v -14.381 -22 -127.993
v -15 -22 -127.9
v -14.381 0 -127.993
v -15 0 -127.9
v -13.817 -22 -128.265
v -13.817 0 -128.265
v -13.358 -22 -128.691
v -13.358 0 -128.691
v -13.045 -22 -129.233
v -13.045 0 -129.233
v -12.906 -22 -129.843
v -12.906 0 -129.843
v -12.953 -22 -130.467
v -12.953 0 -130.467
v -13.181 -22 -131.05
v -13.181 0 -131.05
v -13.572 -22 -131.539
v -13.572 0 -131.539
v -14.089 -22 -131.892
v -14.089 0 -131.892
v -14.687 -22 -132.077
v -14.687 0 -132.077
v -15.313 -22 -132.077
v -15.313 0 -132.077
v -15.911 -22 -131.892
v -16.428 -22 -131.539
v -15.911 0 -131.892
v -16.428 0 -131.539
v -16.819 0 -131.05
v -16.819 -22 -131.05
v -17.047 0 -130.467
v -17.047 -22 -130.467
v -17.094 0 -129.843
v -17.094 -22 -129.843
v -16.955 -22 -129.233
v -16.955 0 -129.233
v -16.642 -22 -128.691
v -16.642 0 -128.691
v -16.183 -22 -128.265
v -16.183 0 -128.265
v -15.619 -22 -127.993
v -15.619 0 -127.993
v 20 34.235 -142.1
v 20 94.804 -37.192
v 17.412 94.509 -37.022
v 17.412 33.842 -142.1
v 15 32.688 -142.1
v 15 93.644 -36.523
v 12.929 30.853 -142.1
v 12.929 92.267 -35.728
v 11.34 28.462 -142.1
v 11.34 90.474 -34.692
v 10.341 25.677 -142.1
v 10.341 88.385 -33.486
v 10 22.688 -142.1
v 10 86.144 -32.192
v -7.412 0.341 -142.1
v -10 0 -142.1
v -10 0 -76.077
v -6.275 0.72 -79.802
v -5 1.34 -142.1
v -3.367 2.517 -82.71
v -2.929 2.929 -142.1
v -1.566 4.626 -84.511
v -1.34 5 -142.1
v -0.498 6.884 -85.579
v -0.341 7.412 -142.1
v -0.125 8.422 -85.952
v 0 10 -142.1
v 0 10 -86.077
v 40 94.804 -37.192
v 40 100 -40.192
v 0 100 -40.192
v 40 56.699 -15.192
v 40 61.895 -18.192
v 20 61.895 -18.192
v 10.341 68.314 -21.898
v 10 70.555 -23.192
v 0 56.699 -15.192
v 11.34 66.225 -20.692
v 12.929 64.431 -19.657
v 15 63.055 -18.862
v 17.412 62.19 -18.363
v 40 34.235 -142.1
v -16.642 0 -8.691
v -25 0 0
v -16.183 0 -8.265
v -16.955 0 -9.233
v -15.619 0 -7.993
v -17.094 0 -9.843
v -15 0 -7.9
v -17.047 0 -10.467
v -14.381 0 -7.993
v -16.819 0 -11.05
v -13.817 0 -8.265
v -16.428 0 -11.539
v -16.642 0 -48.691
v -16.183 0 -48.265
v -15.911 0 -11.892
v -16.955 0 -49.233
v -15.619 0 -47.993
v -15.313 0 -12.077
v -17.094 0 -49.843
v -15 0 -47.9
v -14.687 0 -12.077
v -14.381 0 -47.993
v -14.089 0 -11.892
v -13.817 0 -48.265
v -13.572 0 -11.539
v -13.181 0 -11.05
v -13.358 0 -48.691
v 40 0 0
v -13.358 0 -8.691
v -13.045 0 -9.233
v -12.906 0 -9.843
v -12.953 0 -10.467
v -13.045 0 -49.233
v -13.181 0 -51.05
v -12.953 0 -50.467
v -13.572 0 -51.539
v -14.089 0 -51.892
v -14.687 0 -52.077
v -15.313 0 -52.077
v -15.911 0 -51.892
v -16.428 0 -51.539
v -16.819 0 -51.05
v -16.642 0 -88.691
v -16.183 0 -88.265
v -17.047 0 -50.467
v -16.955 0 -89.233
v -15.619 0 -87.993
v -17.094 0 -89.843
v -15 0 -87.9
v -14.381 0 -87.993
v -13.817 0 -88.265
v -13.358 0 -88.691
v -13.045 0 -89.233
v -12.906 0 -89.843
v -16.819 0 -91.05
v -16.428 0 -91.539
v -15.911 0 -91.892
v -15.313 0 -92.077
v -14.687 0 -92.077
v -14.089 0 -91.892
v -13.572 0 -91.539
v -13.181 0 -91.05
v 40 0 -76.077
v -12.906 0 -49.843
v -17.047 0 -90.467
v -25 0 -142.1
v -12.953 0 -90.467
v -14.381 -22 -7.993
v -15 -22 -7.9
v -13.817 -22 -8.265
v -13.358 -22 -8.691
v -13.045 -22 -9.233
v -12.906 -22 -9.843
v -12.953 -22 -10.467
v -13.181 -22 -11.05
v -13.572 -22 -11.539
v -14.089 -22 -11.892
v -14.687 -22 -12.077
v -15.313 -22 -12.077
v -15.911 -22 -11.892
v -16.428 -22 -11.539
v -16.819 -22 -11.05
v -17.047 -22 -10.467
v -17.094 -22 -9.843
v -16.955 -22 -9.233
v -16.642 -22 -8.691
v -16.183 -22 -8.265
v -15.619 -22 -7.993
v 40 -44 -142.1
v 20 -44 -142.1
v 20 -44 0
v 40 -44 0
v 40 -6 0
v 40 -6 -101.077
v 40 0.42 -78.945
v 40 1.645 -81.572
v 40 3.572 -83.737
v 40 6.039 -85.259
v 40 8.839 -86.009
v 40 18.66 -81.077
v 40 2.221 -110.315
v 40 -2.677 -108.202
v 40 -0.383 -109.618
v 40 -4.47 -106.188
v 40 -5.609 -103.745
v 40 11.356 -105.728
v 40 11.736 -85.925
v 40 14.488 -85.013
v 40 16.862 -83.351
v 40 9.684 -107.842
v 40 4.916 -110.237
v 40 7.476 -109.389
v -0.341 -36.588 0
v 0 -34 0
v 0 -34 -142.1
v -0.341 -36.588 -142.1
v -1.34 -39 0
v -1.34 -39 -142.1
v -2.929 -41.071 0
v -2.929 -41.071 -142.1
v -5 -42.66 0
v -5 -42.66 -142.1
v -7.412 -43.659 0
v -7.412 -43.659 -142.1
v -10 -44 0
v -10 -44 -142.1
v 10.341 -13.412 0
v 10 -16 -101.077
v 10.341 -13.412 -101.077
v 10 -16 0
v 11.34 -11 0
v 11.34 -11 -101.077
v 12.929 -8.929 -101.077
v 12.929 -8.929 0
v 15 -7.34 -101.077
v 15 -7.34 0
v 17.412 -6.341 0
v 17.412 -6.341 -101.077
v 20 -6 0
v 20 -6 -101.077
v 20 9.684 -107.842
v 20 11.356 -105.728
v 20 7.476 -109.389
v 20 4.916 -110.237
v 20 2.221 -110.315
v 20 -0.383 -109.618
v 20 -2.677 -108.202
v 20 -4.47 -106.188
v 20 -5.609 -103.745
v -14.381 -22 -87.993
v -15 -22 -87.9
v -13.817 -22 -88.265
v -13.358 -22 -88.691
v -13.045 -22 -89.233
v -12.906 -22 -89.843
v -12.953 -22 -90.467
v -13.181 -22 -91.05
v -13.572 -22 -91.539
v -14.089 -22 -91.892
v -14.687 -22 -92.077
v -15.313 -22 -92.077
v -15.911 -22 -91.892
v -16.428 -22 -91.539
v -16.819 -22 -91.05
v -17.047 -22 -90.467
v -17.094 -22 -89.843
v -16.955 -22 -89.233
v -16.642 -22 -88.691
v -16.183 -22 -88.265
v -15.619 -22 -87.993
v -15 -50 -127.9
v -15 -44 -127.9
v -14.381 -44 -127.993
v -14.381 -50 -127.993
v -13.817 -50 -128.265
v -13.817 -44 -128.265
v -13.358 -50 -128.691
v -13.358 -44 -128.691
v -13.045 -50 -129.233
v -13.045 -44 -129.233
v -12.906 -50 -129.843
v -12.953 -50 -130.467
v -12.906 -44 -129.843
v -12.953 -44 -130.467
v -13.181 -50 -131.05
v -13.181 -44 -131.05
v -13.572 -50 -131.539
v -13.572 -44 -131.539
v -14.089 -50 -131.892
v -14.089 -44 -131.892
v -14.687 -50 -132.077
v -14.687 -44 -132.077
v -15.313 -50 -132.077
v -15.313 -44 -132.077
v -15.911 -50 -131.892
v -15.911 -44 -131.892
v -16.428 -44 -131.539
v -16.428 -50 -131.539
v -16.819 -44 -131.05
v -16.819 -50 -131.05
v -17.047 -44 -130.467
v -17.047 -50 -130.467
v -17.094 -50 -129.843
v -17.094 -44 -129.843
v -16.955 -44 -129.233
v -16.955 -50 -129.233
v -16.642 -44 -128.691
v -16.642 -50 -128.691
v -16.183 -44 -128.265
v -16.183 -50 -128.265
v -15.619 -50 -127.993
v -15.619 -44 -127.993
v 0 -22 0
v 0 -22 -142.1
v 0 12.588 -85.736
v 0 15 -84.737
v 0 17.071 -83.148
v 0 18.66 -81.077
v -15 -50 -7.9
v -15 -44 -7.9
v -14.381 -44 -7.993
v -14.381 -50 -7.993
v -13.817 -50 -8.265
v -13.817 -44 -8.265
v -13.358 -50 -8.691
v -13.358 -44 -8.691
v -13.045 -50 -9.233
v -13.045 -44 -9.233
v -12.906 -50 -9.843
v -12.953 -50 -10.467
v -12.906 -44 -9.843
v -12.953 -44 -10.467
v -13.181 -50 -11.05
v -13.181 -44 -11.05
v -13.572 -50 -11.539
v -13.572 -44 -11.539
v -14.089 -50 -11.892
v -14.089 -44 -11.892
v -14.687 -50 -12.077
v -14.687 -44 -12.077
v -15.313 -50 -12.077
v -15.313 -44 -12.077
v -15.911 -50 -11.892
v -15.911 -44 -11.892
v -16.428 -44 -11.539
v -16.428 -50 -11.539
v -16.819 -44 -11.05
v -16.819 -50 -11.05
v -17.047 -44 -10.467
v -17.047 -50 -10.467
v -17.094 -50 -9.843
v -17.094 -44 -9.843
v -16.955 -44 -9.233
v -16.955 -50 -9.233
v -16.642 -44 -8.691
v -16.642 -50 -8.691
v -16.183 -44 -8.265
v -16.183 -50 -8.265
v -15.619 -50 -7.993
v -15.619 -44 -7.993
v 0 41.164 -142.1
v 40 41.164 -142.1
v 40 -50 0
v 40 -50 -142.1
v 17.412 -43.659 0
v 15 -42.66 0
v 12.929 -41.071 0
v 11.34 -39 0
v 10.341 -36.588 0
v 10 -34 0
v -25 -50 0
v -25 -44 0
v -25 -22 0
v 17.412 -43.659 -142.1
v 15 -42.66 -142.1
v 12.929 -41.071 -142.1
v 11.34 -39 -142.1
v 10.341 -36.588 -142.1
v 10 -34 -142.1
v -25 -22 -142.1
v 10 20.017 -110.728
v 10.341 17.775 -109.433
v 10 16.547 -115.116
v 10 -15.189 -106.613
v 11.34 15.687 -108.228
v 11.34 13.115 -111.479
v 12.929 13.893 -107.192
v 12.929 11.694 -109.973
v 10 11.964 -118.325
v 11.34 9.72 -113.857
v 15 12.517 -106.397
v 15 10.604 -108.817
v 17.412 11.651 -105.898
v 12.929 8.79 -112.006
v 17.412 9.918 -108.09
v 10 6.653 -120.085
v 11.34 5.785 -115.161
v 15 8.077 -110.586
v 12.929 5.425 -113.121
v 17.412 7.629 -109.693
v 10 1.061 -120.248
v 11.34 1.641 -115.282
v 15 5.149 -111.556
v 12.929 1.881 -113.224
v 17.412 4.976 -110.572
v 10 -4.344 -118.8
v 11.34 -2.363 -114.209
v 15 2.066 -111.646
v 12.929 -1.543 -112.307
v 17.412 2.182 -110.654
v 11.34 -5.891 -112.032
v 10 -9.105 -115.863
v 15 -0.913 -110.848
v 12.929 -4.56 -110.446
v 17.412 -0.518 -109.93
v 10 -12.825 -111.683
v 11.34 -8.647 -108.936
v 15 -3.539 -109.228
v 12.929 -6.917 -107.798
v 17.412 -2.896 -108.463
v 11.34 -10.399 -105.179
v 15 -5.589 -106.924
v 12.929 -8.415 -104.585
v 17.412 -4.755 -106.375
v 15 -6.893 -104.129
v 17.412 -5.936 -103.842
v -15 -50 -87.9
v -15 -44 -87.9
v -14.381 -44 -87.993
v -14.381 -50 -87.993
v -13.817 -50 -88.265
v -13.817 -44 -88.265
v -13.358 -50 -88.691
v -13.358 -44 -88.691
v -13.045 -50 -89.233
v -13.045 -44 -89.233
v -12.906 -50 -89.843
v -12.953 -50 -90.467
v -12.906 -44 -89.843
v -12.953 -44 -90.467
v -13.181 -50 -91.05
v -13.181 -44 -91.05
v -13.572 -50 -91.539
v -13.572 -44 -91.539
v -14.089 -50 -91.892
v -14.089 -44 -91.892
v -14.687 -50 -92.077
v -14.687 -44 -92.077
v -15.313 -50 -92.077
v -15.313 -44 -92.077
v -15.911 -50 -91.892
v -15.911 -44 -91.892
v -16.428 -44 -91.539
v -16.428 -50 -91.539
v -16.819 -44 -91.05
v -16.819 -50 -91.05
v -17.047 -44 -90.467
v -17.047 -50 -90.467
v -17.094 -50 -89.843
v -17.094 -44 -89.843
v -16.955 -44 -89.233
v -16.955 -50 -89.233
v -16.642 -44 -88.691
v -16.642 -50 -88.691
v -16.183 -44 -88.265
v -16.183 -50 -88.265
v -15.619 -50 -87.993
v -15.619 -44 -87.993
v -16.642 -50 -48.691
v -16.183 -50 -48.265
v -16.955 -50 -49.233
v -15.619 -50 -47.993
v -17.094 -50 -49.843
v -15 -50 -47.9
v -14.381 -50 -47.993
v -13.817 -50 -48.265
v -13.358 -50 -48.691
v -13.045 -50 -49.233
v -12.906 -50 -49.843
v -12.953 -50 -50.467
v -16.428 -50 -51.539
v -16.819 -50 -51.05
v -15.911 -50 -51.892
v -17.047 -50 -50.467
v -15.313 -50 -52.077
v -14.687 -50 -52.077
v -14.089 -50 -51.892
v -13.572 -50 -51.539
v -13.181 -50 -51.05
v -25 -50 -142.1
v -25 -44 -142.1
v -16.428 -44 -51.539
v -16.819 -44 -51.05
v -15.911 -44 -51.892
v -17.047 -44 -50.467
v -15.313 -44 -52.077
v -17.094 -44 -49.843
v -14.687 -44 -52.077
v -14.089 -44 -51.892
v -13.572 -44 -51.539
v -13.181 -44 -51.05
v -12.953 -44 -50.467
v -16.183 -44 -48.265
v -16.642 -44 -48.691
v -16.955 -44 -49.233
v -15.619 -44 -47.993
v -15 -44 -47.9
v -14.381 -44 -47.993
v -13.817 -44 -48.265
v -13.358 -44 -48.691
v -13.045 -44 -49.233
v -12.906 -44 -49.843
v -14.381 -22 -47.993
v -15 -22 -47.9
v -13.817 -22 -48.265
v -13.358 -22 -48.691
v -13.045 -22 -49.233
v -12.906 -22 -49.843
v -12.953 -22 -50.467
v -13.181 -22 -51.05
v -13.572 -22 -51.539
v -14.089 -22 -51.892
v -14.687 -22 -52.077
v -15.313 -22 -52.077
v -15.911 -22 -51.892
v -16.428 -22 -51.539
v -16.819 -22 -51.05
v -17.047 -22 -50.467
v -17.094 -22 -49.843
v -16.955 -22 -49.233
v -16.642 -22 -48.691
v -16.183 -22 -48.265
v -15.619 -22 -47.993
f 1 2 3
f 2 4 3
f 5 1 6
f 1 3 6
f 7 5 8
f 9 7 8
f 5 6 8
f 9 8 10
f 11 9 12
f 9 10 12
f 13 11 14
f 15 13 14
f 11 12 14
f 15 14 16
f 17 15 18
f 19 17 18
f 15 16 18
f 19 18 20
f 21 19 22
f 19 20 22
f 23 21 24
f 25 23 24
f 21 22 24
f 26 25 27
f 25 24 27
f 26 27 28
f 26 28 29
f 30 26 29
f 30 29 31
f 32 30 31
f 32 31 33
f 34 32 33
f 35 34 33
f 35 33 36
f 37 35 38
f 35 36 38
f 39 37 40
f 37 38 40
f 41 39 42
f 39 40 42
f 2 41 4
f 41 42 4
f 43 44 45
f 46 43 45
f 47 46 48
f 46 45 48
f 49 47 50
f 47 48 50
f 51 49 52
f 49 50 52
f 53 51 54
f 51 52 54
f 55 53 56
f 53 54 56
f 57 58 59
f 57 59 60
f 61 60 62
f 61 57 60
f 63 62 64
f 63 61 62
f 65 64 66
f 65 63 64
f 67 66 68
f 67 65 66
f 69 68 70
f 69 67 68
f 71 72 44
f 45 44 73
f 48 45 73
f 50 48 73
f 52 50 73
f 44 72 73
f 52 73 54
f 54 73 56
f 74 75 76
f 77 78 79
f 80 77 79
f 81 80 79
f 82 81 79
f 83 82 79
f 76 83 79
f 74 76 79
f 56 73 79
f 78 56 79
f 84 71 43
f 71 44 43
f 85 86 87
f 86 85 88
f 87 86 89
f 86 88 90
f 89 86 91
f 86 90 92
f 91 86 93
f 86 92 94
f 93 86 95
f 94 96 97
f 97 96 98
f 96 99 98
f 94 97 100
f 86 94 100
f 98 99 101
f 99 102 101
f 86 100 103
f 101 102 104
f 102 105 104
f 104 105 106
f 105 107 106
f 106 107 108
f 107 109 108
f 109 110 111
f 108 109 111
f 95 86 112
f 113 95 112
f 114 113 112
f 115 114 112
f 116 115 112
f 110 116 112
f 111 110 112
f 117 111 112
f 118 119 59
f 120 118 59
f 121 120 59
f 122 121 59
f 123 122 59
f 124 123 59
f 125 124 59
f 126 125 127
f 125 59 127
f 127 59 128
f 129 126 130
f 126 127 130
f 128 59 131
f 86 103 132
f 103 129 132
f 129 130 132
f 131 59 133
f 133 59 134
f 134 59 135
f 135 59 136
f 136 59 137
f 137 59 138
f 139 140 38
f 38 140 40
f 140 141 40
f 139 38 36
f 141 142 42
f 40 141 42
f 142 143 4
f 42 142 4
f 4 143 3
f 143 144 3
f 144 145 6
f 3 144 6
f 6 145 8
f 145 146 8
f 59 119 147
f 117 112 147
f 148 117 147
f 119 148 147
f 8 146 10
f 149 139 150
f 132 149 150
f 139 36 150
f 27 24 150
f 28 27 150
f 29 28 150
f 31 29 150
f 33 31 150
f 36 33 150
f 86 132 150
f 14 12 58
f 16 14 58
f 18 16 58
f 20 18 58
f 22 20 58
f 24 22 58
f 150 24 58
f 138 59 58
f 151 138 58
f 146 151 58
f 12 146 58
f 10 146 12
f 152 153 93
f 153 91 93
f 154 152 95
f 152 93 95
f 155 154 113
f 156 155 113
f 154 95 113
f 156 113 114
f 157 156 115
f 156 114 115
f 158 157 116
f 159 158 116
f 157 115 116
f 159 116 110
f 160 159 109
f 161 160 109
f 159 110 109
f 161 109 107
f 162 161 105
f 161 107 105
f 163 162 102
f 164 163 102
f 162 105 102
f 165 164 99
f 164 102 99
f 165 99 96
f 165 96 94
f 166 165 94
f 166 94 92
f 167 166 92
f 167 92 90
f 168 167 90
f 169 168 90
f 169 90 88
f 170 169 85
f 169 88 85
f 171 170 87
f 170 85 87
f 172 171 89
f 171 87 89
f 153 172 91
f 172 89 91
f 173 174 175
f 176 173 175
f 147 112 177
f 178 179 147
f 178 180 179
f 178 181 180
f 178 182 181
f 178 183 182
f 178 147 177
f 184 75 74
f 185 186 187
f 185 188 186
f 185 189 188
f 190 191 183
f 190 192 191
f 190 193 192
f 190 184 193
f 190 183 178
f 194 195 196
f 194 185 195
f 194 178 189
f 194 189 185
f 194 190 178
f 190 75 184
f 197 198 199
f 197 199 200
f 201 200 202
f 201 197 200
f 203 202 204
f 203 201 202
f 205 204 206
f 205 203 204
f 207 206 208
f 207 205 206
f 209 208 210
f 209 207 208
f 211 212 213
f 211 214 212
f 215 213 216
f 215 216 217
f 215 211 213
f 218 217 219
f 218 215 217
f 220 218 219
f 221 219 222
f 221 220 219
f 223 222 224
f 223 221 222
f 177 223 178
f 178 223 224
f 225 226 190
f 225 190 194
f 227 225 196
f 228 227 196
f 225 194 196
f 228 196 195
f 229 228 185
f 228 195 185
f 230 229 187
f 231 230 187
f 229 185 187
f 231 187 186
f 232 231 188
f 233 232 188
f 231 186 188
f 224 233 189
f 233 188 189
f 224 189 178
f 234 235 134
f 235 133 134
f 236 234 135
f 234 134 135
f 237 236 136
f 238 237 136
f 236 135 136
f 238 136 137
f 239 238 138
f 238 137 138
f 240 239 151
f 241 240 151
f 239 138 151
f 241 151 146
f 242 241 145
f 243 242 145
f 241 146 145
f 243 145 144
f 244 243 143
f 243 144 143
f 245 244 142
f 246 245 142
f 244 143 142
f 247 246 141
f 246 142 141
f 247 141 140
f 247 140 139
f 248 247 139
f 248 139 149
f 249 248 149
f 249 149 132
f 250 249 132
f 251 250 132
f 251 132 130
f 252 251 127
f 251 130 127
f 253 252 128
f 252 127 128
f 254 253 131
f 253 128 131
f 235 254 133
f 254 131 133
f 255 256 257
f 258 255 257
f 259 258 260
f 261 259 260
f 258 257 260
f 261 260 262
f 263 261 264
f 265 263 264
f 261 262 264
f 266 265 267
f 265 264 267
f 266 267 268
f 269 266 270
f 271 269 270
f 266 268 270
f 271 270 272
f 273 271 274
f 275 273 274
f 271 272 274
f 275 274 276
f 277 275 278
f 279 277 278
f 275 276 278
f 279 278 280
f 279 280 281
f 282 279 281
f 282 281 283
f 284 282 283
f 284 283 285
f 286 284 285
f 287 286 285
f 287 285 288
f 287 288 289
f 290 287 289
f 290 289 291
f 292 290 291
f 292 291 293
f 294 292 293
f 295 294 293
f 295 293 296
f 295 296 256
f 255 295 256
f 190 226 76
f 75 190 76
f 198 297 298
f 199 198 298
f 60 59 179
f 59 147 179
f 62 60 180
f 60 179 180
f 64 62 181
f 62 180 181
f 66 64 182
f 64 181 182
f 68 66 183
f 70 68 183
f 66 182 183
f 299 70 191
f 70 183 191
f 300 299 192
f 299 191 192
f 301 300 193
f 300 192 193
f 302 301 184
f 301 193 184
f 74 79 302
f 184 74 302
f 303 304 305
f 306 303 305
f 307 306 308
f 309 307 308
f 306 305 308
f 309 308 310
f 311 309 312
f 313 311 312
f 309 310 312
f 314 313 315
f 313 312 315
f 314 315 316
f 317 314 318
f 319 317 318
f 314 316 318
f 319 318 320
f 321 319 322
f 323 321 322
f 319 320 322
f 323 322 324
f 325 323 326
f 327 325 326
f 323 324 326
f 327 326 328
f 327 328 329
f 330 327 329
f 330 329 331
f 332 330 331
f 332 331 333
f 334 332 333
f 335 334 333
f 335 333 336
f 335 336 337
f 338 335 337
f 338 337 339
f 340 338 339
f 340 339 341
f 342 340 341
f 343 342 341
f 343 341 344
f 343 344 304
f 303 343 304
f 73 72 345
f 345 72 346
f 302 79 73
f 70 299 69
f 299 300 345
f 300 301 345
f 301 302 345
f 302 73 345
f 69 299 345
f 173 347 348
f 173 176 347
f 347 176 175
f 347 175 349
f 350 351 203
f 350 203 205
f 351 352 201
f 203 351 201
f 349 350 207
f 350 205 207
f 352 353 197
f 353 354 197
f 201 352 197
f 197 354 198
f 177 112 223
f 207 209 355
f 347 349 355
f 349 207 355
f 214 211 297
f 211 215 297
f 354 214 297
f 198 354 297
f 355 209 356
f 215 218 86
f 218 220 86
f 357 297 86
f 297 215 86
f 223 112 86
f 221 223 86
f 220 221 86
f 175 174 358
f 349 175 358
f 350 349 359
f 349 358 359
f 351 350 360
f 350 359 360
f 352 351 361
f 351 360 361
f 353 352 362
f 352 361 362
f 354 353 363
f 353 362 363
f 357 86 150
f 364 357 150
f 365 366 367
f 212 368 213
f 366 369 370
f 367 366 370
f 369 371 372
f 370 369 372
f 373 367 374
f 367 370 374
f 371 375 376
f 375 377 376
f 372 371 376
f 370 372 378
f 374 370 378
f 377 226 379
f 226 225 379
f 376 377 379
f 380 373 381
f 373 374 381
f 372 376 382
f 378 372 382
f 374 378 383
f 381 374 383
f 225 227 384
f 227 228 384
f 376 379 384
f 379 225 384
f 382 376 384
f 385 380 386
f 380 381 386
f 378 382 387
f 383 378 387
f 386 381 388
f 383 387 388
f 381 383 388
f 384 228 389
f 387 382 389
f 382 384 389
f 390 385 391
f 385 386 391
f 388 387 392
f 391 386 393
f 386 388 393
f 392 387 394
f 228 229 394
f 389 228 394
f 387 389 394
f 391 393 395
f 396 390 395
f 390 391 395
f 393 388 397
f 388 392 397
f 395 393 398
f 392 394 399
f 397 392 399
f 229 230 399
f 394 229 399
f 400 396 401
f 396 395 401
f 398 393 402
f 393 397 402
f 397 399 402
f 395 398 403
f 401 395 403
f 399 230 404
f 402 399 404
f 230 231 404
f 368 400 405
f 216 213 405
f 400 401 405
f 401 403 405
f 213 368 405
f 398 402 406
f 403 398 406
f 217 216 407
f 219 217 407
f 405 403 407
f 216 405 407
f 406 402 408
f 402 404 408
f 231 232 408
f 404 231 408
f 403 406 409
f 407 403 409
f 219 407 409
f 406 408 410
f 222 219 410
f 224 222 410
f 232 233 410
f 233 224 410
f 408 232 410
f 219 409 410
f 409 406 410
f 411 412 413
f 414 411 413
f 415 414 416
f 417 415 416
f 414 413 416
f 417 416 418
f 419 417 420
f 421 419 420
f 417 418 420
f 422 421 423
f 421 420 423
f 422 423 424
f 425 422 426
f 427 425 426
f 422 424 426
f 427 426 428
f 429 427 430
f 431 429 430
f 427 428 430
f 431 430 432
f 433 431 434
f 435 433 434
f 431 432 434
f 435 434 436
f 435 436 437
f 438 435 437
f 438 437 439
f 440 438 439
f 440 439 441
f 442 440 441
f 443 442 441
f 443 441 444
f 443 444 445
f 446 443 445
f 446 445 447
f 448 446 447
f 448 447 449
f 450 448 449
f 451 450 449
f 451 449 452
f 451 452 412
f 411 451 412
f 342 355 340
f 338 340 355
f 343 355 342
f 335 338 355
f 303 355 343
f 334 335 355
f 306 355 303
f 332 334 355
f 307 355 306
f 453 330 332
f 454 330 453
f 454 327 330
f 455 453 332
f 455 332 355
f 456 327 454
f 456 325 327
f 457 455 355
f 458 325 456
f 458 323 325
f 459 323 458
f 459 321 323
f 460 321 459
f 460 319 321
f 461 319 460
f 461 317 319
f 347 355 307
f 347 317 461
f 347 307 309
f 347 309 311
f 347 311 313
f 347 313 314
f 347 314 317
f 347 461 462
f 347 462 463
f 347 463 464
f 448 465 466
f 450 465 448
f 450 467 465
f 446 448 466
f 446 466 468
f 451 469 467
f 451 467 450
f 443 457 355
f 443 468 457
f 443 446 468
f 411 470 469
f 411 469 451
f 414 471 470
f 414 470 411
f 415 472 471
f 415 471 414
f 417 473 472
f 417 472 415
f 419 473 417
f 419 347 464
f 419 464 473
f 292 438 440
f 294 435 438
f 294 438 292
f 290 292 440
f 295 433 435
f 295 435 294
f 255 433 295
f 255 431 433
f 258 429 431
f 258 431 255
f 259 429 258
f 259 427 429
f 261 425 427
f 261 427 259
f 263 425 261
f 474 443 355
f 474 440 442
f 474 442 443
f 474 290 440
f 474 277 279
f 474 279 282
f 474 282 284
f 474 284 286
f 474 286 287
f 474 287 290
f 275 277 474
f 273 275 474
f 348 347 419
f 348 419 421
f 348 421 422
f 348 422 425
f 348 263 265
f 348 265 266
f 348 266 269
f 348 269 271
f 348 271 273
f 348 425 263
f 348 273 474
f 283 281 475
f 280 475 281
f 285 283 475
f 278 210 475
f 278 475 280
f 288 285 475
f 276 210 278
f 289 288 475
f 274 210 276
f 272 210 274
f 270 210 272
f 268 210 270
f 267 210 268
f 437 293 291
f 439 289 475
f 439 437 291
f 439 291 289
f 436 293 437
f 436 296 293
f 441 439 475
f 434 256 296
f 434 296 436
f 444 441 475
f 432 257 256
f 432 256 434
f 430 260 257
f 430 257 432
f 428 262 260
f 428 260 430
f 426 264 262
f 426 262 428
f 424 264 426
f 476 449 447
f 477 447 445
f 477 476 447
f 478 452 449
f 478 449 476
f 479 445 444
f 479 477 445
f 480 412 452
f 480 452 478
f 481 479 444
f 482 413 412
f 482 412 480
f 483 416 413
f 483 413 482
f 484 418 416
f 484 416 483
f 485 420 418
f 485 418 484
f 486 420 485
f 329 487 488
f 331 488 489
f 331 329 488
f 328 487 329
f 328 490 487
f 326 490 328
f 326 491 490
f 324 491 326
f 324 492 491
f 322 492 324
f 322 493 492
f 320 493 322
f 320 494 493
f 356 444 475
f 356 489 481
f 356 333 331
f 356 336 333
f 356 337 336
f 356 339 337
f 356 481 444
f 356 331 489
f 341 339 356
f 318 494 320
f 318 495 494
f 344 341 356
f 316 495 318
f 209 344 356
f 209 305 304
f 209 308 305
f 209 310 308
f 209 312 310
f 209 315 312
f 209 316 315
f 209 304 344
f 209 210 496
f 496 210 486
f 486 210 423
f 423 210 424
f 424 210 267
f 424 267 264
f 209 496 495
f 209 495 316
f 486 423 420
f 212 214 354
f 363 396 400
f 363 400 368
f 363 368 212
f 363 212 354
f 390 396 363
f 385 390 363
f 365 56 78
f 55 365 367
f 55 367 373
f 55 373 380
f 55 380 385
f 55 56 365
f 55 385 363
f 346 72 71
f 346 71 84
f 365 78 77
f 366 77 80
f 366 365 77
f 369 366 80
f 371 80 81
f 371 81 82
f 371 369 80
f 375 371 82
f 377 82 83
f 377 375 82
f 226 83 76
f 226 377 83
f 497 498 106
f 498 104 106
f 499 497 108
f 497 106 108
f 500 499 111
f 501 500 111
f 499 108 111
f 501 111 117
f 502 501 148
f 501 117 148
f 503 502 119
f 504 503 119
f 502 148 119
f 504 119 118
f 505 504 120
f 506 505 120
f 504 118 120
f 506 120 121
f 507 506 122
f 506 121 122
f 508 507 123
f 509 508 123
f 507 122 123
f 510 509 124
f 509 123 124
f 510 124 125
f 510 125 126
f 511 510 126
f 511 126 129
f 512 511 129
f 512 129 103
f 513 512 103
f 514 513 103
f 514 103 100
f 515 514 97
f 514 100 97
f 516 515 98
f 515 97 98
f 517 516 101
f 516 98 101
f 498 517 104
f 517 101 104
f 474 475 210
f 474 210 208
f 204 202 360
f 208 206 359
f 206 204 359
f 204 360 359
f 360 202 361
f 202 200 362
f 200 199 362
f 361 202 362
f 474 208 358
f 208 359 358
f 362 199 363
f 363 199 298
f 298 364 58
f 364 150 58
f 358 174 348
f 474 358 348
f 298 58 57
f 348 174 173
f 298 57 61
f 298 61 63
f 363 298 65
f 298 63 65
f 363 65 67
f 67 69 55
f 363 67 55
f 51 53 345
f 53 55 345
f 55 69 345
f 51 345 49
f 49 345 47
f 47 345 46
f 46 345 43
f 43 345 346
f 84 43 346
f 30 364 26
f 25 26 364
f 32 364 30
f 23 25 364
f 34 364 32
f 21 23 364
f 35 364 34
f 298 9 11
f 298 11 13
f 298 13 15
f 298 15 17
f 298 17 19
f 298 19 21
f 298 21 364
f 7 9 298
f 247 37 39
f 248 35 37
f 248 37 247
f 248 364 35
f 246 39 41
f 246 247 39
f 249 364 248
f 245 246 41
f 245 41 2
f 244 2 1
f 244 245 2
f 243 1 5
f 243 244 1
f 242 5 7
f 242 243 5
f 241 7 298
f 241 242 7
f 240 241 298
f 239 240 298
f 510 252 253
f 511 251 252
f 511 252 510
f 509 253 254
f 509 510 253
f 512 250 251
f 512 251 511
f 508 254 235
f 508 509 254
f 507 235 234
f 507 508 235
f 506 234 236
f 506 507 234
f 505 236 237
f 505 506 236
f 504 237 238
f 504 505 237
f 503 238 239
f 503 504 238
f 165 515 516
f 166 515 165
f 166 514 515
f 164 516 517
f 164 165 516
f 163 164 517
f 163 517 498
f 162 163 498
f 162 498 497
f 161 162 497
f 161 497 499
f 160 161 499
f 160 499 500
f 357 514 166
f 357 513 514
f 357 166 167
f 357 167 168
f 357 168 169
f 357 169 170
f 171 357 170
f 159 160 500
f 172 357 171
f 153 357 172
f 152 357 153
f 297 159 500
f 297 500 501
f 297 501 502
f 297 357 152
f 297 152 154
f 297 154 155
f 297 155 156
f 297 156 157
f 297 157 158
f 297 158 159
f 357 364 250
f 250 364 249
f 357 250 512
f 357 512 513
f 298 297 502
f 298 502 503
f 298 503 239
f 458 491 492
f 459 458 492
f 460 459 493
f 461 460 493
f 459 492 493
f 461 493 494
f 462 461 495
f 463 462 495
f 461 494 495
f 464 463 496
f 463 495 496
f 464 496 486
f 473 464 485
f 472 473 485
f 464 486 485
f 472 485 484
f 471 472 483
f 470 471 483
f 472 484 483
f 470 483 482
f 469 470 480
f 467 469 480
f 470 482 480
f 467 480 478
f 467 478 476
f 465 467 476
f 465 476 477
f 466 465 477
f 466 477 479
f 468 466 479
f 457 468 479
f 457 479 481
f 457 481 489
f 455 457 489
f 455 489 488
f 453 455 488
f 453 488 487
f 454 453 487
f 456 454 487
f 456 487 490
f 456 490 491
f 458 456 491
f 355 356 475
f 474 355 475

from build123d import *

# Parameters (mm, degrees)
EXTRUDE_1_DEPTH     = 40
EXTRUDE_1_2_DEPTH   = 40
EXTRUDE_2_DEPTH     = 10
EXTRUDE_4_DEPTH     = 25
EXTRUDE_5_DEPTH     = 25
FILLET_4_R          = 10
FILLET_5_R          = 10
FILLET_6_R          = 10
FILLET_7_R          = 10
CUT_EXTRUDE_1_DEPTH = 30
FILLET_11_R         = 10
SKETCH_5_R          = 2.099999999999999
SKETCH_5_R_2        = 2.0999999999999983
SKETCH_5_R_3        = 2.1
SKETCH_5_R_4        = 2.0999999999999965
CUT_EXTRUDE_2_DEPTH = 255.61889299989065
CUT_EXTRUDE_3_DEPTH = 255.61889299989065
CUT_EXTRUDE_4_DEPTH = 240.0365573985137
EXTRUDE_6_DEPTH     = 16
SKETCH_5_2_R        = 2.099999999999999
SKETCH_5_2_R_2      = 2.0999999999999983
SKETCH_5_2_R_3      = 2.1
SKETCH_5_2_R_4      = 2.0999999999999965
CUT_EXTRUDE_5_DEPTH = 179.3042624280185


with BuildPart() as part:
    # 草图1 → 凸台-拉伸1 (new body)
    with BuildSketch(Plane(origin=(0, 0, 0), x_dir=(0, 0, -1), z_dir=(1, 0, 0))):
        Polygon((113.39745962155384, 1.22e-15), (0, 0), (0, -6), (135.7897644669674, -5.999999999999998), (18.192378864667774, 61.89488223348293), (15.192378864667806, 56.69872981077631), align=None)
    extrude(amount=EXTRUDE_1_DEPTH)



with BuildPart() as body_2:
    # 草图1 → Extrude 1 2 (new body)
    with BuildSketch(Plane(origin=(0, 0, 0), x_dir=(0, 0, -1), z_dir=(1, 0, 0))):
        Polygon((0, -44.00000000000001), (0, -50), (230.71796769724395, -50), (230.71796769724395, -10), (40.192378864667546, 99.99999999999838), (37.19237886466758, 94.80384757729173), (224.71796769724395, -13.464101615137764), (224.71796769724395, -44.00000000000001), align=None)
    extrude(amount=EXTRUDE_1_2_DEPTH)


with BuildPart() as part_1:
    add(part.part)

    add(body_2.part)  # 凸台-拉伸2 merges body 2
    # 草图1<6> → 凸台-拉伸2 (add)
    with BuildSketch(Plane(origin=(0, 0, 0), x_dir=(0, 0, -1), z_dir=(1, 0, 0))):
        Polygon((6, -6), (0, -6), (0, -44.00000000000001), (6.000000000000005, -44.00000000000001), (224.71796769724395, -44.00000000000001), (224.71796769724395, -13.464101615137768), (42.388531287374235, 91.80384757729178), (37.192378864667575, 94.80384757729173), (18.192378864667766, 61.89488223348294), (23.38853128737442, 58.89488223348298), (135.7897644669674, -5.999999999999998), align=None)
    extrude(amount=EXTRUDE_2_DEPTH)

    # 草图1<9> → 凸台-拉伸4 (add)
    with BuildSketch(Plane(origin=(0, 0, 0), x_dir=(0, 0, -1), z_dir=(1, 0, 0))):
        Polygon((6.000000000000005, -44.00000000000001), (5.33e-15, -44.00000000000001), (0, -50), (224.71796769724395, -50), (224.71796769724395, -44.00000000000001), align=None)
    extrude(amount=-EXTRUDE_4_DEPTH)

    # 草图2 → 凸台-拉伸5 (add)
    with BuildSketch(Plane.ZY):
        Polygon((0, 0), (-213.3974596215552, -2.429e-14), (-223.78976446696848, -6.0000000000000275), (0, -6), align=None)
    extrude(amount=EXTRUDE_5_DEPTH)

    # 圆角4
    fillet_4_edges = [part_1.edges().sort_by_distance(p)[0] for p in [
        (0, -1.86e-14, -163.39745962155453),
        (20, 1.22e-15, -113.39745962155384),
    ]]
    fillet(fillet_4_edges, radius=FILLET_4_R)

    # 圆角5
    fillet_5_edges = [part_1.edges().sort_by_distance(p)[0] for p in [
        (0, -44.00000000000001, -112.35898384862197),
        (0, -6.000000000000014, -111.89488223348424),
    ]]
    fillet(fillet_5_edges, radius=FILLET_5_R)

    # 圆角6
    fillet_6_edges = [part_1.edges().sort_by_distance(p)[0] for p in [
        (25, -44.00000000000001, -224.71796769724395),
        (25, -13.464101615137766, -224.71796769724395),
    ]]
    fillet(fillet_6_edges, radius=FILLET_6_R)

    # 圆角7
    fillet_7_edges = [part_1.edges().sort_by_distance(p)[0] for p in [
        (18.999999999999993, -10, -230.71796769724395),
    ]]
    fillet(fillet_7_edges, radius=FILLET_7_R)

    # 草图3 → 切除-拉伸1 (cut)
    with BuildSketch(Plane(origin=(40, 0, 0), x_dir=(0, 0, -1), z_dir=(1, 0, 0))):
        with BuildLine():
            Line((101.0769515458646, -5.999999999999998), (135.7897644669674, -5.999999999999998))
            Line((135.7897644669674, -5.999999999999998), (105.72758664047566, 11.356406460551396))
            ThreePointArc((105.72758664047566, 11.356406460551396), (110.06128863892687, 0.8939243206071232), (101.0769515458646, -5.999999999999998))
        make_face()
    extrude(amount=-CUT_EXTRUDE_1_DEPTH, mode=Mode.SUBTRACT)

    # 圆角11
    fillet_11_edges = [part_1.edges().sort_by_distance(p)[0] for p in [
        (10, 36.62564434701707, -61.95998275257166),
        (10, 0.8939243206071223, -110.06128863892687),
        (10, -44.00000000000001, -107.35898384862197),
        (10, -41.07106781186548, -221.78903550910942),
        (10, -26.618802153517038, -224.71796769724395),
        (10, -14.237604307034038, -223.37822173508832),
        (10, -5.999999999999999, -50.5384757729323),
        (10, 42.11324865405104, -128.45517328095573),
    ]]
    fillet(fillet_11_edges, radius=FILLET_11_R)

    # 草图5 → 切除-拉伸2 (cut, through all)
    with BuildSketch(Plane(origin=(0, 0, 0), x_dir=(1, 0, 0), z_dir=(0, 1, 1e-17))):
        with Locations((-15.000000000000002, 10)):
            Circle(SKETCH_5_R)
        with Locations((-15.000000000000139, 50)):
            Circle(SKETCH_5_R_2)
        with Locations((-15.000000000000275, 90)):
            Circle(SKETCH_5_R_3)
        with Locations((-15.000000000000412, 130)):
            Circle(SKETCH_5_R_4)
    extrude(amount=-CUT_EXTRUDE_2_DEPTH, mode=Mode.SUBTRACT)

    # 草图6 → 切除-拉伸3 (cut, through all)
    with BuildSketch(Plane(origin=(0, 0, 0), x_dir=(1, 0, 0), z_dir=(0, 1, 1e-17))):
        Polygon((-25, 231.5180230769059), (40, 231.5180230769059), (40.00000000000001, 142.1), (-24.99999999999999, 142.1), align=None)
    extrude(amount=-CUT_EXTRUDE_3_DEPTH, mode=Mode.SUBTRACT)

    # 草图6<2> → 切除-拉伸4 (cut, through all)
    with BuildSketch(Plane(origin=(0, 0, 0), x_dir=(1, 0, 0), z_dir=(0, 1, 1e-17))):
        Polygon((-25, 231.5180230769059), (40, 231.5180230769059), (40.00000000000001, 142.1), (-24.99999999999999, 142.1), align=None)
    extrude(amount=CUT_EXTRUDE_4_DEPTH, mode=Mode.SUBTRACT)

    # 草图8 → 凸台-拉伸6 (add)
    with BuildSketch(Plane.XZ.offset(6)):
        Polygon((-25, -7.4e-16), (-24.99999999999999, -142.1), (0, -142.1), (0, 0), align=None)
    extrude(amount=EXTRUDE_6_DEPTH)

    # 草图5<2> → 切除-拉伸5 (cut, through all)
    with BuildSketch(Plane(origin=(0, 0, 0), x_dir=(1, 0, 0), z_dir=(0, 1, 1e-17))):
        with Locations((-15.000000000000002, 10)):
            Circle(SKETCH_5_2_R)
        with Locations((-15.000000000000139, 50)):
            Circle(SKETCH_5_2_R_2)
        with Locations((-15.000000000000275, 90)):
            Circle(SKETCH_5_2_R_3)
        with Locations((-15.000000000000412, 130)):
            Circle(SKETCH_5_2_R_4)
    extrude(amount=-CUT_EXTRUDE_5_DEPTH, mode=Mode.SUBTRACT)


solid = part_1.part
